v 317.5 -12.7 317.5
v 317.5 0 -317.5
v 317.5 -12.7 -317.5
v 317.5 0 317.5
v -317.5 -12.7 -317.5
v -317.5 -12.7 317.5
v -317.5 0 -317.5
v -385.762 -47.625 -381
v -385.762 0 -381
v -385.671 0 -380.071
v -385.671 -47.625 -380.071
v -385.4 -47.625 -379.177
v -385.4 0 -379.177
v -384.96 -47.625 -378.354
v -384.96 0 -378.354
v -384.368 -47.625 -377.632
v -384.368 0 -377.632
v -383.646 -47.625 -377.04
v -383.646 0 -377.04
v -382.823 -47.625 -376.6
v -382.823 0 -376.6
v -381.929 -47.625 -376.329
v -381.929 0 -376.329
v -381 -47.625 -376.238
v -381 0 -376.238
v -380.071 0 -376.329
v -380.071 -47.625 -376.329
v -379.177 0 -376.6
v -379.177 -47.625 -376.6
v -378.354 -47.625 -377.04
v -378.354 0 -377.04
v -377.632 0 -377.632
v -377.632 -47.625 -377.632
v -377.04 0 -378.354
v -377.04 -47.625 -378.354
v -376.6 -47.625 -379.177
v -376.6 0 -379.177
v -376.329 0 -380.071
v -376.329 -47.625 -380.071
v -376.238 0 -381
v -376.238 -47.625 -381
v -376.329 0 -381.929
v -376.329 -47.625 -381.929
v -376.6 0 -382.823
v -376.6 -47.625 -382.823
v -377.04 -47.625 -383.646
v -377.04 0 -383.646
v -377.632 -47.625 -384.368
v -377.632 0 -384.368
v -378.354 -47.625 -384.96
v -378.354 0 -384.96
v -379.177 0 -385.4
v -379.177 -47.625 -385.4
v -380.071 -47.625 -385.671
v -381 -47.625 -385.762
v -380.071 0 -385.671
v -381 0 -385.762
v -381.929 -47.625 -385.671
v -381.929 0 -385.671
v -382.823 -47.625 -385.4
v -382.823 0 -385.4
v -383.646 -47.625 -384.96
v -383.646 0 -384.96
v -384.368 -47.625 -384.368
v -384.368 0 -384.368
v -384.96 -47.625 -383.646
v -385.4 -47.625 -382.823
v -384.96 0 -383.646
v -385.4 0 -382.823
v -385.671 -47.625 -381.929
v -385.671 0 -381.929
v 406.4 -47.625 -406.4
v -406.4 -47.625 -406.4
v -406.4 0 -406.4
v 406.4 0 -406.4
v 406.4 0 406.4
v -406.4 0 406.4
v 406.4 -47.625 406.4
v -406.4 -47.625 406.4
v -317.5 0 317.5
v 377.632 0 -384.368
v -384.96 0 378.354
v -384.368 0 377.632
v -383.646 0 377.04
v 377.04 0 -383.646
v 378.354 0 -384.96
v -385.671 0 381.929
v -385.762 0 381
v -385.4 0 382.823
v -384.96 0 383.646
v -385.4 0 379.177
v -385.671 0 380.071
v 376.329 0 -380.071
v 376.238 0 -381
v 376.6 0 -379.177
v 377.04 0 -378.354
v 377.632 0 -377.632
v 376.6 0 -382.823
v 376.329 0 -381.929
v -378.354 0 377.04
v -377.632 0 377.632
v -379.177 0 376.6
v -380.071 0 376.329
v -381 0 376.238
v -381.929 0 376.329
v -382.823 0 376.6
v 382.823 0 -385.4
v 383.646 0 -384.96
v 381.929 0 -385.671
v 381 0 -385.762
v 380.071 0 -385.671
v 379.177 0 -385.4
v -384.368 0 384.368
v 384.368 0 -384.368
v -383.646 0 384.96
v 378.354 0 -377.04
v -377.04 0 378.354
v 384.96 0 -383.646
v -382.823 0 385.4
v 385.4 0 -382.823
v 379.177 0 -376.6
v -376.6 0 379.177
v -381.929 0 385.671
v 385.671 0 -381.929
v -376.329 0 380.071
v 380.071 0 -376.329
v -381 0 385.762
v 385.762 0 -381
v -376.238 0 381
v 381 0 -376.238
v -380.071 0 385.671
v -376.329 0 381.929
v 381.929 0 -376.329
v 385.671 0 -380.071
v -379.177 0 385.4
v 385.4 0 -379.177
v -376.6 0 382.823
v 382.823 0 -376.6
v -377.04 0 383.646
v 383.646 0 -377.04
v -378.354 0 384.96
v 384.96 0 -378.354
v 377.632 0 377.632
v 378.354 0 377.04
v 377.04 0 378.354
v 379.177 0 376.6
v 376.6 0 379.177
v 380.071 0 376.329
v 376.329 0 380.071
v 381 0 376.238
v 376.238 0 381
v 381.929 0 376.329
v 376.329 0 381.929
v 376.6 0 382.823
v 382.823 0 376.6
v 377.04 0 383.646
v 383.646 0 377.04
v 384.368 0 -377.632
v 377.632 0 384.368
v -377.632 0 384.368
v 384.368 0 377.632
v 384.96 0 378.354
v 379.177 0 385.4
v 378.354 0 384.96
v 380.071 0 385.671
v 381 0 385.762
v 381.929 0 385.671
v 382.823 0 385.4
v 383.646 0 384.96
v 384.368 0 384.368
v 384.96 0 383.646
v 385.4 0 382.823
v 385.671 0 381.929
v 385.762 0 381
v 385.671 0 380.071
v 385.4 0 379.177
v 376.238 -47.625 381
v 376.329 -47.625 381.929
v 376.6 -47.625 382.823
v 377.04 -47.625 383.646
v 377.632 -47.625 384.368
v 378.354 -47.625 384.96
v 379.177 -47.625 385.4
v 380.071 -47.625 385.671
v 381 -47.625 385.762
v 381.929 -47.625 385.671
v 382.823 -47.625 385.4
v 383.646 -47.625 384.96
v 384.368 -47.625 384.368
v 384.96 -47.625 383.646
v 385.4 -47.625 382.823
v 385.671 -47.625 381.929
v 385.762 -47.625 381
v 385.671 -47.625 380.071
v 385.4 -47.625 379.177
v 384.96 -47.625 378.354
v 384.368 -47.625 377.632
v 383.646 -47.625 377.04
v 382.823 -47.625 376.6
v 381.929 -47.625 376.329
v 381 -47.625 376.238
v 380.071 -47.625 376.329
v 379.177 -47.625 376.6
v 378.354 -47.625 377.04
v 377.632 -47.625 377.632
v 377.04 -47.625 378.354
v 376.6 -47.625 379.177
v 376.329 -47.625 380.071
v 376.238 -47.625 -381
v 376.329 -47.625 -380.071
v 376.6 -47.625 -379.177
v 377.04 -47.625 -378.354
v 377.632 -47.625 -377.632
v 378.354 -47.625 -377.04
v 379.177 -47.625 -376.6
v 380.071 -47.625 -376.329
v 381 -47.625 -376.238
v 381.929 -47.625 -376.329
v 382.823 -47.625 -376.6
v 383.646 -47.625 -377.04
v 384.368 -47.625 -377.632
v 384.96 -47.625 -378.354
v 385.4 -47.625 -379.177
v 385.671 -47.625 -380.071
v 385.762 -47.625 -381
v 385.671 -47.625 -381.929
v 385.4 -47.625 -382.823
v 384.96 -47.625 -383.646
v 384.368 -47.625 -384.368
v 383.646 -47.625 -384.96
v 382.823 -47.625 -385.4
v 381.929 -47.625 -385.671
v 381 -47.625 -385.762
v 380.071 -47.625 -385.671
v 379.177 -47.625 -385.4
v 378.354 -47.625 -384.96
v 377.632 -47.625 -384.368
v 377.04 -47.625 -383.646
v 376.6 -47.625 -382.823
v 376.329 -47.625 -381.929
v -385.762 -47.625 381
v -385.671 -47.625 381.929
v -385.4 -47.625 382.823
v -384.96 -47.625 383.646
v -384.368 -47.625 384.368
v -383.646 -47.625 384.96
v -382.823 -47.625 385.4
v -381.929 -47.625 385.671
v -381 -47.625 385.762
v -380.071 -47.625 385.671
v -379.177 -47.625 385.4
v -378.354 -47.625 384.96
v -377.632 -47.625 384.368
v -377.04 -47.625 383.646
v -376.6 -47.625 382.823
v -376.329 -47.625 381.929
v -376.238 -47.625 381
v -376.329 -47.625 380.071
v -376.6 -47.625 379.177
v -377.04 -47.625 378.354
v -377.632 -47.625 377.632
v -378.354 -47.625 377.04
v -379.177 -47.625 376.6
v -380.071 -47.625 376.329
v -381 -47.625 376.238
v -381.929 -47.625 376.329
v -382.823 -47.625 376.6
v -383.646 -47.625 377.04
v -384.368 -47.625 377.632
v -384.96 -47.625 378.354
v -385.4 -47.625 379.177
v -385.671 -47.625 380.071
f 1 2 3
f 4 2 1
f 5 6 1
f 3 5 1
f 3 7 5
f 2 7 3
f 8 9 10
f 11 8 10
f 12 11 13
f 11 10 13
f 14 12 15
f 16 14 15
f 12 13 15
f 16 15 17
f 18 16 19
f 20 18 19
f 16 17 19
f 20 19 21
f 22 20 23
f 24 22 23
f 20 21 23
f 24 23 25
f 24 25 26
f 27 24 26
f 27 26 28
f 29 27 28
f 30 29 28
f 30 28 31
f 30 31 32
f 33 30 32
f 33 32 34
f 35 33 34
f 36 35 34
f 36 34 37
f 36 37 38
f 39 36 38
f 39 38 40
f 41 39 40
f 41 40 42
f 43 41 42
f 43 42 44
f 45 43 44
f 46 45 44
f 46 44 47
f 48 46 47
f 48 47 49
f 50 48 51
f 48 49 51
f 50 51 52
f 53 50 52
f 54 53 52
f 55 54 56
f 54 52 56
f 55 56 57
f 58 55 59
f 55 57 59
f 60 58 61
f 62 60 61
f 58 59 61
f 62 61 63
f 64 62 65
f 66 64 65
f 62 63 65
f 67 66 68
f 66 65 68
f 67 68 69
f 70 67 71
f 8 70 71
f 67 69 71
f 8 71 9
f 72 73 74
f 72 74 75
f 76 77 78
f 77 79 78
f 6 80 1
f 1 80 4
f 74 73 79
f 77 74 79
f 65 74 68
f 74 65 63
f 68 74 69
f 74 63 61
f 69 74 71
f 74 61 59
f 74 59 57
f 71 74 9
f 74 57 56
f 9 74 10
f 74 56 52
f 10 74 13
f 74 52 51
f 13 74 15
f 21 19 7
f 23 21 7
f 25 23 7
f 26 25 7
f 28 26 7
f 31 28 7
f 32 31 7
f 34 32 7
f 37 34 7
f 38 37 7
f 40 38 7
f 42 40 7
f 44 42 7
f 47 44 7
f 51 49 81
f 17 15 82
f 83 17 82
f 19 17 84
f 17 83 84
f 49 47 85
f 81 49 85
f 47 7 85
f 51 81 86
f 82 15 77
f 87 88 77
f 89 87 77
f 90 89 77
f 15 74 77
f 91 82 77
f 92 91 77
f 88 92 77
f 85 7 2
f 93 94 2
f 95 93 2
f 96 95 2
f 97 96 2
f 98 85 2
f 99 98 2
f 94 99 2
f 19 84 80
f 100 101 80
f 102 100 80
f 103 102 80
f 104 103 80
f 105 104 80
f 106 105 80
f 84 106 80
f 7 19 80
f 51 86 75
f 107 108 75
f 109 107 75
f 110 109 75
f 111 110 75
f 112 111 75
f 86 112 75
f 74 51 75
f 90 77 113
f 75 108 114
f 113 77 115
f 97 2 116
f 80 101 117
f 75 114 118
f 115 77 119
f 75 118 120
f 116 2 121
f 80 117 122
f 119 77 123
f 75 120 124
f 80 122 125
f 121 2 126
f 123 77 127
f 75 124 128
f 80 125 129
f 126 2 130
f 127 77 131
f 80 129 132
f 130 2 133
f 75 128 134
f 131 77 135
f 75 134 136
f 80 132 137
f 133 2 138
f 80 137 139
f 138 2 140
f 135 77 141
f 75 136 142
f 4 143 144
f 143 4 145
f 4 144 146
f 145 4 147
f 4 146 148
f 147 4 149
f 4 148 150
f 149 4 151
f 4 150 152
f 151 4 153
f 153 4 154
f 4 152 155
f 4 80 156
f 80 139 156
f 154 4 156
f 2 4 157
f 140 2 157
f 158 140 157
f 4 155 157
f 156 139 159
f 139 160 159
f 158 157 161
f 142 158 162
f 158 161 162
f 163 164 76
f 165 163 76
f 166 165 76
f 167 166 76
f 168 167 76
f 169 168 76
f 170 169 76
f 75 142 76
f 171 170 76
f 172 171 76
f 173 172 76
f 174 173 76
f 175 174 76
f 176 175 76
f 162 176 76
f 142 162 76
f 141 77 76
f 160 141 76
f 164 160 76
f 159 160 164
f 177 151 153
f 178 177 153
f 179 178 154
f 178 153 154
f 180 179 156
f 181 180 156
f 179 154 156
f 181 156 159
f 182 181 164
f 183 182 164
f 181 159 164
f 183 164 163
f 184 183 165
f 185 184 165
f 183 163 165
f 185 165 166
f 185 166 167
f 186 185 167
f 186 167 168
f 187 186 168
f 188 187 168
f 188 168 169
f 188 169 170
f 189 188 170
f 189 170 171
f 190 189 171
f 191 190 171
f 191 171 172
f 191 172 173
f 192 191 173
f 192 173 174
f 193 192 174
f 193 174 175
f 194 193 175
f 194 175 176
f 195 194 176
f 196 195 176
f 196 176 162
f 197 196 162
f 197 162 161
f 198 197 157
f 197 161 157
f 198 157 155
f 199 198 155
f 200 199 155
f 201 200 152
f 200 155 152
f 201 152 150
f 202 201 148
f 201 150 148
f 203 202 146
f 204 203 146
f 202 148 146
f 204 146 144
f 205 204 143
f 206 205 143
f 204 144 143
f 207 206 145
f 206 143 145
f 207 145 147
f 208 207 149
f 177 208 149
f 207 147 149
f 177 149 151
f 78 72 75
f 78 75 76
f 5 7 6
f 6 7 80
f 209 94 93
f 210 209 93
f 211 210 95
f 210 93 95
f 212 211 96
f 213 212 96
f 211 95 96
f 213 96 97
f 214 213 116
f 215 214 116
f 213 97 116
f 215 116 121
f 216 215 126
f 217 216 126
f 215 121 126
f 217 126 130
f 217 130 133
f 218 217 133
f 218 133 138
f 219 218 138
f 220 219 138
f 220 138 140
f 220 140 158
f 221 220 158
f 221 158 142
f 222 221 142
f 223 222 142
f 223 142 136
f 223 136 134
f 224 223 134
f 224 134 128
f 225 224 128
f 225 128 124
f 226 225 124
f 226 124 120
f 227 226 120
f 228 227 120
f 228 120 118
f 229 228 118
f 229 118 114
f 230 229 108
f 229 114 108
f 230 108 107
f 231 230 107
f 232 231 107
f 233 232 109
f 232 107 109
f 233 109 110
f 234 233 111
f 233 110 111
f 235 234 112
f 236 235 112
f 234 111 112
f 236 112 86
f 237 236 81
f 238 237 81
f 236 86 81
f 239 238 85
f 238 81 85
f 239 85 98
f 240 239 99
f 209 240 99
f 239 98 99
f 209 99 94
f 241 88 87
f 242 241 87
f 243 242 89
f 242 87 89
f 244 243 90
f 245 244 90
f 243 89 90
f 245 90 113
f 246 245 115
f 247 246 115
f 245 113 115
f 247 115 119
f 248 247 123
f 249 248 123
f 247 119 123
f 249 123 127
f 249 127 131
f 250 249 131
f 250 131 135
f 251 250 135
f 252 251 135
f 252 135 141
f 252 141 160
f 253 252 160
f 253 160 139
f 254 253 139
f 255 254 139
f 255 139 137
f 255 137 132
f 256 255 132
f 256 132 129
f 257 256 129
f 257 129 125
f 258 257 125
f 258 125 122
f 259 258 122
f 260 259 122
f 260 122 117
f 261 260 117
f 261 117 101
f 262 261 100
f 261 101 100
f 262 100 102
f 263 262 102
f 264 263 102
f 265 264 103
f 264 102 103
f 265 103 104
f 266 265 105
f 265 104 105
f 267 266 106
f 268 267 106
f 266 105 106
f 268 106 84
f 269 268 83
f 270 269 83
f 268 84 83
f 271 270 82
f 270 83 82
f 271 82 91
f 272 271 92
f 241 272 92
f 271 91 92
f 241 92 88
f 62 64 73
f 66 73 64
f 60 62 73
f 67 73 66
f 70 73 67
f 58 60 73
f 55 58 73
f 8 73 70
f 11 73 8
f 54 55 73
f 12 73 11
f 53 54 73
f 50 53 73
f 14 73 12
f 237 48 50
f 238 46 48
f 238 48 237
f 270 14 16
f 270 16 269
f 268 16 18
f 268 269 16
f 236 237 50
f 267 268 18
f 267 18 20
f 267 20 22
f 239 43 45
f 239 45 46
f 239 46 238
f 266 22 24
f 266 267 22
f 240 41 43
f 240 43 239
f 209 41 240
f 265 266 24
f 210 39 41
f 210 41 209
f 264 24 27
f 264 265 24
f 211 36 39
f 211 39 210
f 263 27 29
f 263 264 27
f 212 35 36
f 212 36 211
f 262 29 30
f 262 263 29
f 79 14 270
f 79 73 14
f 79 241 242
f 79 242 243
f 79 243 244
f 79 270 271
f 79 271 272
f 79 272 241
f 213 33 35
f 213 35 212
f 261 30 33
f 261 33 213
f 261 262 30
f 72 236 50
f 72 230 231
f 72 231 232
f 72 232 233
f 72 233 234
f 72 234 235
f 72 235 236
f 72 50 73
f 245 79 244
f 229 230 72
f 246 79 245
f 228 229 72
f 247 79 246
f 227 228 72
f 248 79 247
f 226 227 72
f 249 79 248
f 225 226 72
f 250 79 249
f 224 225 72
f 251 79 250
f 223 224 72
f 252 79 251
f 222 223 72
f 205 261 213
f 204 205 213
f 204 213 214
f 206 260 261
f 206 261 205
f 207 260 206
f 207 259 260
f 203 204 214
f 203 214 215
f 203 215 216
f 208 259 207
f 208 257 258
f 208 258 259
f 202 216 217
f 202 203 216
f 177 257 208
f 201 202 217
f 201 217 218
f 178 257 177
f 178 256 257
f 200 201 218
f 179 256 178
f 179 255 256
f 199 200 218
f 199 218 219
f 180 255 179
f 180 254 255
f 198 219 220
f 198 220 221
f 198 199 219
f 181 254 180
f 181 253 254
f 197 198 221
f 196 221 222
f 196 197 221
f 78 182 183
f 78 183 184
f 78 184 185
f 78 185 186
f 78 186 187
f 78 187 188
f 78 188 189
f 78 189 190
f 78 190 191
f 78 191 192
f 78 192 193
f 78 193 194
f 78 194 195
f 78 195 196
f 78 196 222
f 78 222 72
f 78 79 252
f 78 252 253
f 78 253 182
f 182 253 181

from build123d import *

# Parameters (mm, degrees)
F0_W          = 812.8
F0_H          = 812.8
F0_W_2        = 635
F0_H_2        = 635
F1_DEPTH      = 38.1
F3_W          = 812.8
F3_H          = 812.8
F4_DEPTH      = 9.525
F4_DEPTH_BACK = 25.4
F5_R          = 4.7625
F6_DEPTH      = 254


with BuildPart() as f1:
    # F0 (on Front) → F1 (new body)
    with BuildSketch(Plane.XZ):
        Rectangle(F0_W, F0_H)
        Rectangle(F0_W_2, F0_H_2, mode=Mode.SUBTRACT)
    extrude(amount=F1_DEPTH)

    # F3 (on face) → F4 (join, two sides)
    with BuildSketch(Plane.XZ.offset(38.1)) as f4_sk:
        Rectangle(F3_W, F3_H)
    extrude(amount=F4_DEPTH)
    extrude(f4_sk.sketch, amount=-F4_DEPTH_BACK)

    # F5 (on face) → F6 (cut)
    with BuildSketch(Plane(origin=(0, 0, 0), x_dir=(-1, 0, 0), z_dir=(0, 1, 0))):
        with Locations((-381, -381)):
            Circle(F5_R)
        with Locations((381, -381)):
            Circle(F5_R)
        with Locations((381, 381)):
            Circle(F5_R)
        with Locations((-381, 381)):
            Circle(F5_R)
    extrude(amount=-F6_DEPTH, mode=Mode.SUBTRACT)


solid = f1.part
